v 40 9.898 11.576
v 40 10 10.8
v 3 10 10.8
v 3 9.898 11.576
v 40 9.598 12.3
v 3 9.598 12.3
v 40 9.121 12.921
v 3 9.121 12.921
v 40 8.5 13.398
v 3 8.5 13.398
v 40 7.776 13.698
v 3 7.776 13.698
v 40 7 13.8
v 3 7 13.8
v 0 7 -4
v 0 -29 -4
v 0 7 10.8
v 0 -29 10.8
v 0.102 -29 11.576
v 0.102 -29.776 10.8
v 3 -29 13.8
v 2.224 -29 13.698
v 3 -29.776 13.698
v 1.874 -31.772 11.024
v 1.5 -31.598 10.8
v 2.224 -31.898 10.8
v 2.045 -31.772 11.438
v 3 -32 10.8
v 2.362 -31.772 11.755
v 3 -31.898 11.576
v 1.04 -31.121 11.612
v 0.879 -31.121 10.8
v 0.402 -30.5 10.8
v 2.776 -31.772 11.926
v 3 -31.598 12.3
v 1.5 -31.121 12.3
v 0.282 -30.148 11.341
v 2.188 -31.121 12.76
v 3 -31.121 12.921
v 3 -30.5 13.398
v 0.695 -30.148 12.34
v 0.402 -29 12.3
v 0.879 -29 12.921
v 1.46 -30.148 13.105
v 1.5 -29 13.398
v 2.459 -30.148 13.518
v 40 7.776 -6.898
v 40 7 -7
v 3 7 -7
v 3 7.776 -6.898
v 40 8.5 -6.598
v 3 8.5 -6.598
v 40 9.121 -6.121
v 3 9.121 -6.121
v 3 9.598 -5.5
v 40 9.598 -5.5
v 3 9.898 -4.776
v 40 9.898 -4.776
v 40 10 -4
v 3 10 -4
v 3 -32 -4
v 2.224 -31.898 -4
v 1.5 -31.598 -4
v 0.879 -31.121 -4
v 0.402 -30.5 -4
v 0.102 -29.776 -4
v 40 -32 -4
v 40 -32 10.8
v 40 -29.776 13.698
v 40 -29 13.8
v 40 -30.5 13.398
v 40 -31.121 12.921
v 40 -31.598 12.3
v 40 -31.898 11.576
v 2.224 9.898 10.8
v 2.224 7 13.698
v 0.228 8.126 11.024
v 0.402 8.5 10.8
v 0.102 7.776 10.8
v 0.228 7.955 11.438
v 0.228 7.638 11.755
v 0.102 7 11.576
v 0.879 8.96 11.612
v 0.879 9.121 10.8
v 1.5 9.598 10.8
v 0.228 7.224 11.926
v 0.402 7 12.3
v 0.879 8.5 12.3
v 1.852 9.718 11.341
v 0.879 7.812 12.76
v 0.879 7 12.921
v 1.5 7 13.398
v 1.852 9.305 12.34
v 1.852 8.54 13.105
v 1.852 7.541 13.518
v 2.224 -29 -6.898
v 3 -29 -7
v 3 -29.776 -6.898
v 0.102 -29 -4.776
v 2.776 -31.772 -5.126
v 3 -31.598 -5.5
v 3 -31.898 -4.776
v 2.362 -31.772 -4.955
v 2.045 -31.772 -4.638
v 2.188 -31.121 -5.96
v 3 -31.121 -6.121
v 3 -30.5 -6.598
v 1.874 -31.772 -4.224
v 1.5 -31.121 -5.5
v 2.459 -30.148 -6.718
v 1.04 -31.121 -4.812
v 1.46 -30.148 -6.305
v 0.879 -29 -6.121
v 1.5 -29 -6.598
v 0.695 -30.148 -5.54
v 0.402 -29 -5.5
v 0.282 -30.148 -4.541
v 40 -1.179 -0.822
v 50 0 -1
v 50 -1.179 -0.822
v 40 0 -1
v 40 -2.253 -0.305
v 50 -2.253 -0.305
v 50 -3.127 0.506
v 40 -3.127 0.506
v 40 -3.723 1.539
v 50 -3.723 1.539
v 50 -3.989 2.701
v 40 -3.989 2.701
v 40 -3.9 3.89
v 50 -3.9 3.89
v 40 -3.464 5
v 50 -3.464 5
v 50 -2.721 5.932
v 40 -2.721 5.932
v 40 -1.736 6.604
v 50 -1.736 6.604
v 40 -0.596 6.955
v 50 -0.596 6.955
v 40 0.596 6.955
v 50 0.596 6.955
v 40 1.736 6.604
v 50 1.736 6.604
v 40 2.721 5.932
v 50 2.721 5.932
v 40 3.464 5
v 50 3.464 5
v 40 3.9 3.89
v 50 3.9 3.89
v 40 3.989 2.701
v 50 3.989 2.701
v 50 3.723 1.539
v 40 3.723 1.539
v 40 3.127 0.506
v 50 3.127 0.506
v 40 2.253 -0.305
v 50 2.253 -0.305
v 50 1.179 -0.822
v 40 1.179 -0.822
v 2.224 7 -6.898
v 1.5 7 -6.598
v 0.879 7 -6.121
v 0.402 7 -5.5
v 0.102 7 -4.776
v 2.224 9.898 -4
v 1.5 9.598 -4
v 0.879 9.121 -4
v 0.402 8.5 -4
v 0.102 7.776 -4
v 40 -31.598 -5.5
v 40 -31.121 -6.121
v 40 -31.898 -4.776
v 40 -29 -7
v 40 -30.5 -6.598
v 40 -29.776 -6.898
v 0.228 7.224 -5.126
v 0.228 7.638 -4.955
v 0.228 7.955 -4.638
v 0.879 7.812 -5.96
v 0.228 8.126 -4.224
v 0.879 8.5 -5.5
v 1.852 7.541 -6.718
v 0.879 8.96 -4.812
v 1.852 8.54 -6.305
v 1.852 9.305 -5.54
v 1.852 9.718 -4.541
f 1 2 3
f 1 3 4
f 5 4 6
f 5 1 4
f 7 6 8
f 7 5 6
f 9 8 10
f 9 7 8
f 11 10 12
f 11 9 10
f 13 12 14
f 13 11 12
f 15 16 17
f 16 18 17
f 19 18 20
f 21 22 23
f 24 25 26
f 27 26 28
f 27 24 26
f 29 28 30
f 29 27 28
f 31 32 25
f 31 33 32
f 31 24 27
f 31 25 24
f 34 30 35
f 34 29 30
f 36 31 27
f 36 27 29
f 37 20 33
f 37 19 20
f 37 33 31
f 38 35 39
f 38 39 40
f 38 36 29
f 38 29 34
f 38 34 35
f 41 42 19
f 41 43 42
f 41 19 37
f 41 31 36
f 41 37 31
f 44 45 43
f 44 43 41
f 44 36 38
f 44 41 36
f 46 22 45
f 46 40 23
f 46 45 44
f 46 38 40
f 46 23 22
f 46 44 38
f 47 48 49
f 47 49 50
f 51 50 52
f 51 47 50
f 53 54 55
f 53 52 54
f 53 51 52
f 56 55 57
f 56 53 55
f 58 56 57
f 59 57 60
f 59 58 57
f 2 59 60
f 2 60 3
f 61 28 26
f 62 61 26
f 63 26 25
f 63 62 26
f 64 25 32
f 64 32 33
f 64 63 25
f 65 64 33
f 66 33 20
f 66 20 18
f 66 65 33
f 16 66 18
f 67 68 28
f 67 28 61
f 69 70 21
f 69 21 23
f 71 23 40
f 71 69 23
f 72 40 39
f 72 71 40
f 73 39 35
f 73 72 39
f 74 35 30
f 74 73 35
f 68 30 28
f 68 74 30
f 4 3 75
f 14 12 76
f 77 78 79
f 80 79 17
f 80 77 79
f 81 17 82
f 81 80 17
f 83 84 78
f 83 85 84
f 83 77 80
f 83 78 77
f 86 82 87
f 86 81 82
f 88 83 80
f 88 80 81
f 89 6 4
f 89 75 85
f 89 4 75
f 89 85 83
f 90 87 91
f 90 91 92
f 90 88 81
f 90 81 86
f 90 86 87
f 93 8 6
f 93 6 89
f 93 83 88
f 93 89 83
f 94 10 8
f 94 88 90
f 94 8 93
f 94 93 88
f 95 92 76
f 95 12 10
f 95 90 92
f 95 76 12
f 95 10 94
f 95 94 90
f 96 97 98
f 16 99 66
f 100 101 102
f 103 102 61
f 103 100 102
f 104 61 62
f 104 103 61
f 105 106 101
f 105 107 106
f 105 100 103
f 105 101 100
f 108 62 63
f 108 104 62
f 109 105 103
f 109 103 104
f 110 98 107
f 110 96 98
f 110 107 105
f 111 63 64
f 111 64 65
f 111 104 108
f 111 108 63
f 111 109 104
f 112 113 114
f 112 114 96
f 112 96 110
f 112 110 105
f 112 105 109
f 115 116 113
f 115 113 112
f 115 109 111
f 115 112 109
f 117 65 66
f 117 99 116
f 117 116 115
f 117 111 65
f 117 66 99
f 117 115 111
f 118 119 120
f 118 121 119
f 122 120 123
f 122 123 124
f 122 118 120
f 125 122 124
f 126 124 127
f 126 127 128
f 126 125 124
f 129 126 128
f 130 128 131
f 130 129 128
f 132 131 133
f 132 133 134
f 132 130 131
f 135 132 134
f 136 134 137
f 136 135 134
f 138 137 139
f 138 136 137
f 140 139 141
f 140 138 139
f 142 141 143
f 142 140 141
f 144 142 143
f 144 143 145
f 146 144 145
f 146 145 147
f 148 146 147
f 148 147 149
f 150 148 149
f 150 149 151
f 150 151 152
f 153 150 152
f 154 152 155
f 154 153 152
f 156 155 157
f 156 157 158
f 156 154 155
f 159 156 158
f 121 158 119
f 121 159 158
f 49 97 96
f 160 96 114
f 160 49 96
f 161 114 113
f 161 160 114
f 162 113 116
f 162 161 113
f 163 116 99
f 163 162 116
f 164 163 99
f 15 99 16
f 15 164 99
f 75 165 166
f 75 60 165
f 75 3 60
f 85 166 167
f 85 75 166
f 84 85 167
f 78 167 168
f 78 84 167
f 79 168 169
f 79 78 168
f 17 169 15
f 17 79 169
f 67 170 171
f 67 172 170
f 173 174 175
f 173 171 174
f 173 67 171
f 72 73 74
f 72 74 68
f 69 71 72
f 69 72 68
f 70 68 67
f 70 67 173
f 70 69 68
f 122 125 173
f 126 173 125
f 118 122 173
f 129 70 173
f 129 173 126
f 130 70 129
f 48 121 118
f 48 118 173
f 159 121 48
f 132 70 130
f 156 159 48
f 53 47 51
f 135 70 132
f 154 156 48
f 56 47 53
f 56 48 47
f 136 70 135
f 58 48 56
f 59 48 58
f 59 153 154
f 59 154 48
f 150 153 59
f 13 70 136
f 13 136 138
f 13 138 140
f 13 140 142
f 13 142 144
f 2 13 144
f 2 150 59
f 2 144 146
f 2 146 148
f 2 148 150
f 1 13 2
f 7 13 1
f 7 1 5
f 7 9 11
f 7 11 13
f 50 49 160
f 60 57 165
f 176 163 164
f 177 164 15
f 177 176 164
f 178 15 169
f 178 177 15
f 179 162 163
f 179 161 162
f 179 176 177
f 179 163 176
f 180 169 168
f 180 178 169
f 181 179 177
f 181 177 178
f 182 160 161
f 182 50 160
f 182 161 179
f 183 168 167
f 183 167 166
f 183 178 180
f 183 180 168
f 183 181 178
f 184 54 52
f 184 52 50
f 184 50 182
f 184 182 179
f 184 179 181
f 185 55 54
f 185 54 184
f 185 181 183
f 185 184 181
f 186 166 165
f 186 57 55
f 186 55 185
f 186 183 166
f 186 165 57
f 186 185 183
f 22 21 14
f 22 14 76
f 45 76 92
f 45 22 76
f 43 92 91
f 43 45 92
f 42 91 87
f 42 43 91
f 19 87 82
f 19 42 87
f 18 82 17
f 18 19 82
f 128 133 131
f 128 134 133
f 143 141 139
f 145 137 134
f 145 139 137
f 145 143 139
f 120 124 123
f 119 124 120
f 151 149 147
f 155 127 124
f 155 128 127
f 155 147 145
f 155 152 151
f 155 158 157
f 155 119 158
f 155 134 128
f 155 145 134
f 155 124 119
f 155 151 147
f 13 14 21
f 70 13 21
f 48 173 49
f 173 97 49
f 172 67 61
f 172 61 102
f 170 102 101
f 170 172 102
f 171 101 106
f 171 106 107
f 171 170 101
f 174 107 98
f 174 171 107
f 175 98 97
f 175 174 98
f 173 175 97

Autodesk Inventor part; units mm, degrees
ref_plane "YZ Plane" through (0, 0, 0) normal (1, 0, 0) x (0, 1, 0)
ref_plane "XZ Plane" through (0, 0, 0) normal (0, 1, 0) x (-1, 0, 0)
ref_plane "XY Plane" through (0, 0, 0) normal (0, 0, 1) x (1, 0, 0)
sketch "Esquisse1" plane through (0, 0, 0) normal (1, 0, 0) x (0, 1, 0)
  line L0 (10, 13.8) -> (-32, 13.8)
  line L1 (-32, 13.8) -> (-32, -7)
  line L2 (-32, -7) -> (10, -7)
  line L3 (10, -7) -> (10, 13.8)
  point P0 (0, 0)
  dimension "d0" = 42
  dimension "d1" = 20.8
extrude "Extrusion1" add sketch "Esquisse1" along normal blind 40
sketch "Esquisse2" plane through (40, 0, 0) normal (1, 0, 0) x (0, 0, -1)
  circle A0 centre (-3, 0) radius 4
  line L0 (7, 10) -> (-13.8, 10) projected
  line L1 (-3.4, 0) -> (-13.8, 0)
  line L2 (-3, 0) -> (7, 0)
  point P0 (0, 0)
  dimension "d4" = 10
extrude "Extrusion2" add sketch "Esquisse2" along normal blind 10
fillet "Congé1" radius 3 8 edges at (20, 10, 13.8) (20, 10, -7) (0, 10, 3.4) (0, -11, 13.8) (0, -11, -7) (0, -32, 3.4) (20, -32, 13.8) (20, -32, -7)
properties part number "servomoteur"
